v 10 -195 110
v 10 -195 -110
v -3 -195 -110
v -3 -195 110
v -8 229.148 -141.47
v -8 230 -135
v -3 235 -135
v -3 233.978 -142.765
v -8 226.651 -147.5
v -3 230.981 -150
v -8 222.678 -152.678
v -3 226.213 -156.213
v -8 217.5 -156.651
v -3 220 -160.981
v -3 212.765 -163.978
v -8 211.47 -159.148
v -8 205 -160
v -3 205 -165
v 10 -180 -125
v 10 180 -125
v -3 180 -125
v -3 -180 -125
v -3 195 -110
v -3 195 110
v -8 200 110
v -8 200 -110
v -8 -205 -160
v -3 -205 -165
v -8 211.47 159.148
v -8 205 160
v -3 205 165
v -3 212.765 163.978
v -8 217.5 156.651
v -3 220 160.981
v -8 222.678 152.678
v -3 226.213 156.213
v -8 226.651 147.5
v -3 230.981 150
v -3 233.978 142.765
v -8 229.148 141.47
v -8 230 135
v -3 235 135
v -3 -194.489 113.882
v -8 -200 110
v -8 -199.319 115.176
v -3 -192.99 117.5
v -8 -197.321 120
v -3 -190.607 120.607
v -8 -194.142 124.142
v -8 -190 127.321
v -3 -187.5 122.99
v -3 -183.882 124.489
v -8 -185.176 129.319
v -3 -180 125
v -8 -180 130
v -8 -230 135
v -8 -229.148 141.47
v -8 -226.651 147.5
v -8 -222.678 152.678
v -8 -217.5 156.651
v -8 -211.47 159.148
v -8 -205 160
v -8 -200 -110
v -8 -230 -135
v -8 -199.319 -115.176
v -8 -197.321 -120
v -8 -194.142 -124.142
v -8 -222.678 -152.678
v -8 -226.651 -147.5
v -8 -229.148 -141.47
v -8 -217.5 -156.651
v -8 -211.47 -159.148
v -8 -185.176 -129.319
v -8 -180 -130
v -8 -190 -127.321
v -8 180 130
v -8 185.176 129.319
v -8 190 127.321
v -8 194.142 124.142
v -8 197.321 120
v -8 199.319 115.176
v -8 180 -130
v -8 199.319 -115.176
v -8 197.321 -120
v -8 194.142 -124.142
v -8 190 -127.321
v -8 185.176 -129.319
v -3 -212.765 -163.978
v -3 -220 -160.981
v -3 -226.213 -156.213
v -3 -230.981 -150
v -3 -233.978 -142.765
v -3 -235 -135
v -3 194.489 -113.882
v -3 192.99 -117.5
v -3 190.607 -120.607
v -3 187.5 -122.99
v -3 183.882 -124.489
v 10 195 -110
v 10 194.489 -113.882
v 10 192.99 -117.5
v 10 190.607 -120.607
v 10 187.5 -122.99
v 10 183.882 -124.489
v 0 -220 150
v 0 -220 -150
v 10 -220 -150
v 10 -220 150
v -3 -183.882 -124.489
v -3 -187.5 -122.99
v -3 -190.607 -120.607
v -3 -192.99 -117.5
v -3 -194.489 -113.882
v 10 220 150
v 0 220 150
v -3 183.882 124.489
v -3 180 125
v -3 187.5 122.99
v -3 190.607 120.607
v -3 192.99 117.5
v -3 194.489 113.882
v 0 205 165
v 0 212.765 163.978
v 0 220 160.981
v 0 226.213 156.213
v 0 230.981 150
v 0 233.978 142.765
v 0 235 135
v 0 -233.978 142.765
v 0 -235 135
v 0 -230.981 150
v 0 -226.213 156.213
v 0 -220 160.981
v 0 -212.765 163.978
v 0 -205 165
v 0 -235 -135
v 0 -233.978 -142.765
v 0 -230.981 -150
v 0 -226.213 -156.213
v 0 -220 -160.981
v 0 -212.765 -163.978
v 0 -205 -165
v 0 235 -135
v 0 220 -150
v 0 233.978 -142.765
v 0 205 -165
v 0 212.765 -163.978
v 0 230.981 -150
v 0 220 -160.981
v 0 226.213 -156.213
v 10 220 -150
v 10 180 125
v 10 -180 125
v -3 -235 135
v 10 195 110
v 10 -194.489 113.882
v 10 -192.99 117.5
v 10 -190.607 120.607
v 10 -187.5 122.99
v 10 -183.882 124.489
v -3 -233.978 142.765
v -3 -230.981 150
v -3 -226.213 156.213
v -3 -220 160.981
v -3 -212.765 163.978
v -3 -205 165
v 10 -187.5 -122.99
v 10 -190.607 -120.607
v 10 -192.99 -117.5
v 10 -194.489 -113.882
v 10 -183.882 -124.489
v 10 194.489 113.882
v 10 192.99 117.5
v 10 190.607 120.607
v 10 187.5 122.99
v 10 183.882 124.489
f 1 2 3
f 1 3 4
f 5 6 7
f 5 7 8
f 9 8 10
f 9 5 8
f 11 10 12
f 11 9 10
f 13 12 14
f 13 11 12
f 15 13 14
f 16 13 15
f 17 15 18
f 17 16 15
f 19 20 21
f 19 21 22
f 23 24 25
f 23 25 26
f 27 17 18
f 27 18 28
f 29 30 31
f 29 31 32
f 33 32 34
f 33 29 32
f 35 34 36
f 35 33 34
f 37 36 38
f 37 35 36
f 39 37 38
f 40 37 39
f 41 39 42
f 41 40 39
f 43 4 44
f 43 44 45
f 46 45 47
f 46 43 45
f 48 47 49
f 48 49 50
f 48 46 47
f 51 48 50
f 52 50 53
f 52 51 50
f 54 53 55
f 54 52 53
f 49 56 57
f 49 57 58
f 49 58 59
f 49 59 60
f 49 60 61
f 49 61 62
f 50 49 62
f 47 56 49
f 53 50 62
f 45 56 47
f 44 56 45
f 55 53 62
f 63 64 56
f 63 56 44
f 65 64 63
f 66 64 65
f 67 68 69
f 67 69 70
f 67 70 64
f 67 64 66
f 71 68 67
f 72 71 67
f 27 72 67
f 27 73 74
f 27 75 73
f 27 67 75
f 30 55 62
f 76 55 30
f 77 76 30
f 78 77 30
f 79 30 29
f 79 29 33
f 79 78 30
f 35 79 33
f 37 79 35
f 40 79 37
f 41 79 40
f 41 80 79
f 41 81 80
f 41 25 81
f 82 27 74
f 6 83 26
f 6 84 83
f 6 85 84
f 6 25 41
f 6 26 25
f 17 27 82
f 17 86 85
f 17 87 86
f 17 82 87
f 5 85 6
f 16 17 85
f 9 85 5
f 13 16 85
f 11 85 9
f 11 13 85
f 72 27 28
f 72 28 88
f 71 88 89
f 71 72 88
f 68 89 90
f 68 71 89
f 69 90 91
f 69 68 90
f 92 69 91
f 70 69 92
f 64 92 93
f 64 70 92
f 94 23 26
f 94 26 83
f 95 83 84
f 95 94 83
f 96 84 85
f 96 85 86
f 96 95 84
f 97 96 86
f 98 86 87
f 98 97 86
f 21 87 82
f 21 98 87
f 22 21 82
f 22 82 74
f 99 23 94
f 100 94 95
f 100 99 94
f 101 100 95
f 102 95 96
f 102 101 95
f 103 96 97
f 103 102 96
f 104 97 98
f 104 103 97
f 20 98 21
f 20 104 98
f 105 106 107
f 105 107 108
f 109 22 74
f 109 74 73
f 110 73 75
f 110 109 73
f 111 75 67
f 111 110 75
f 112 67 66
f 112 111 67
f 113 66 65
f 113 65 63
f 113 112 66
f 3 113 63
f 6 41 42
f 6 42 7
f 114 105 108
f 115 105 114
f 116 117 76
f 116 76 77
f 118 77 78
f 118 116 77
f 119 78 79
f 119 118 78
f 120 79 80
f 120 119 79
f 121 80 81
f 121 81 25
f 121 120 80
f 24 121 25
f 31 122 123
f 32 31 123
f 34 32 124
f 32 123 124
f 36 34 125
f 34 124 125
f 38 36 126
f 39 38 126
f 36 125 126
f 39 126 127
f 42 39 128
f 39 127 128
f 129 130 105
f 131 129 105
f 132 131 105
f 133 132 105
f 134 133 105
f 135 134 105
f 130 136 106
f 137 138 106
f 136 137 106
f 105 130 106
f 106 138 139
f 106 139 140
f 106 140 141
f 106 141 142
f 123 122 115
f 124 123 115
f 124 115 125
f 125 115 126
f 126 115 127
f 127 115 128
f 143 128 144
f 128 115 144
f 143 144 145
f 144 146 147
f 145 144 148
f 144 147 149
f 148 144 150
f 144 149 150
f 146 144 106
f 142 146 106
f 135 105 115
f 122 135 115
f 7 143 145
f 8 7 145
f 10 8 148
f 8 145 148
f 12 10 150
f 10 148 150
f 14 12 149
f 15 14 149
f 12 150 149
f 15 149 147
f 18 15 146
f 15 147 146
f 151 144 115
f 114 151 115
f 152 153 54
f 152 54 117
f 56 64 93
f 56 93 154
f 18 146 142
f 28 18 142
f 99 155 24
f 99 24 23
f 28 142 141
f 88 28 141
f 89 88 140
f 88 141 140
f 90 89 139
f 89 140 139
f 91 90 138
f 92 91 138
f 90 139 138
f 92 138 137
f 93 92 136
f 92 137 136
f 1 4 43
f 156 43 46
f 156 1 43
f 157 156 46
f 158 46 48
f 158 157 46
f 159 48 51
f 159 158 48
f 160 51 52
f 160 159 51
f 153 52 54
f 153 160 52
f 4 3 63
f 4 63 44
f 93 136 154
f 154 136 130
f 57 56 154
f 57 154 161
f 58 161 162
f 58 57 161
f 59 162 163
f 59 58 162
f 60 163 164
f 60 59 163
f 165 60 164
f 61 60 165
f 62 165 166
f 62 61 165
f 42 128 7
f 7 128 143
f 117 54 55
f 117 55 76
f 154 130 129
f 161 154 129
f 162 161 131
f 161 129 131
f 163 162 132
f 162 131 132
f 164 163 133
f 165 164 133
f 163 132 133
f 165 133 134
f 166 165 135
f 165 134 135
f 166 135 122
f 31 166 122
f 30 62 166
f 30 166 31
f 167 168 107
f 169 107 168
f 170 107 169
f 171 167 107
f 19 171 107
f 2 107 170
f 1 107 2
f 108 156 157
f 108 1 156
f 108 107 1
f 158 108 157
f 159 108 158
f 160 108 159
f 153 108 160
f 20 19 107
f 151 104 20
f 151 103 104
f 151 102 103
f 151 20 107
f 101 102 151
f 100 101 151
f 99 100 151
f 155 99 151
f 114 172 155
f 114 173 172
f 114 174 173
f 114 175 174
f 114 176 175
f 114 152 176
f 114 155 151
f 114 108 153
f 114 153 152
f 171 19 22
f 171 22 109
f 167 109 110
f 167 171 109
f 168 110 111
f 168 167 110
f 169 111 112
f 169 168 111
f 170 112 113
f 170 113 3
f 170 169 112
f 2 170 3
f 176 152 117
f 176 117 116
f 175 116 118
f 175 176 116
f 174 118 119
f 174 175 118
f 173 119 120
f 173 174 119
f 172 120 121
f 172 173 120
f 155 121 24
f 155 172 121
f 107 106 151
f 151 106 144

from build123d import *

# Parameters (mm, degrees)
SKETCH_W     = 440
SKETCH_H     = 300
PAD_DEPTH    = 10
PAD001_DEPTH = 8
CHAMFER_SIZE = 5


with BuildPart() as part:
    # Sketch → Pad (new body)
    with BuildSketch(Plane.YZ):
        Rectangle(SKETCH_W, SKETCH_H)
        with BuildLine():
            Line((-195, 110), (-195, -110))
            ThreePointArc((-195, -110), (-190.606602, -120.606602), (-180, -125))
            Line((-180, -125), (180, -125))
            ThreePointArc((180, -125), (190.606602, -120.606602), (195, -110))
            Line((195, -110), (195, 110))
            ThreePointArc((195, 110), (190.606602, 120.606602), (180, 125))
            Line((180, 125), (-180, 125))
            ThreePointArc((-180, 125), (-190.606602, 120.606602), (-195, 110))
        make_face(mode=Mode.SUBTRACT)
    extrude(amount=PAD_DEPTH)

    # Sketch001 (on Face13 of Pad) → Pad001 (join)
    with BuildSketch(Plane(origin=(0, 0, 0), x_dir=(0, 1, 0), z_dir=(-1, 0, 0))):
        with BuildLine():
            Line((-235, 135), (-235, -135))
            ThreePointArc((-235, -135), (-226.213203, -156.213203), (-205, -165))
            Line((-205, -165), (205, -165))
            ThreePointArc((205, -165), (226.213203, -156.213203), (235, -135))
            Line((235, -135), (235, 135))
            ThreePointArc((235, 135), (226.213203, 156.213203), (205, 165))
            Line((205, 165), (-205, 165))
            ThreePointArc((-205, 165), (-226.213203, 156.213203), (-235, 135))
        make_face()
        with BuildLine():
            Line((-195, 110), (-195, -110))
            ThreePointArc((-195, -110), (-190.606602, -120.606602), (-180, -125))
            Line((-180, -125), (180, -125))
            ThreePointArc((180, -125), (190.606602, -120.606602), (195, -110))
            Line((195, -110), (195, 110))
            ThreePointArc((195, 110), (190.606602, 120.606602), (180, 125))
            Line((180, 125), (-180, 125))
            ThreePointArc((-180, 125), (-190.606602, 120.606602), (-195, 110))
        make_face(mode=Mode.SUBTRACT)
    extrude(amount=PAD001_DEPTH)

    # Chamfer
    chamfer_edges = [part.edges().sort_by_distance(p)[0] for p in [
        (-8, -235, 0),
        (-8, -226.213203, 156.213203),
        (-8, 0, 165),
        (-8, 226.213203, 156.213203),
        (-8, 235, 0),
        (-8, 226.213203, -156.213203),
        (-8, 0, -165),
        (-8, -226.213203, -156.213203),
        (-8, -195, 0),
        (-8, -190.606602, 120.606602),
        (-8, 0, 125),
        (-8, 190.606602, 120.606602),
        (-8, 195, 0),
        (-8, 190.606602, -120.606602),
        (-8, 0, -125),
        (-8, -190.606602, -120.606602),
    ]]
    chamfer(chamfer_edges, length=CHAMFER_SIZE)


solid = part.part
